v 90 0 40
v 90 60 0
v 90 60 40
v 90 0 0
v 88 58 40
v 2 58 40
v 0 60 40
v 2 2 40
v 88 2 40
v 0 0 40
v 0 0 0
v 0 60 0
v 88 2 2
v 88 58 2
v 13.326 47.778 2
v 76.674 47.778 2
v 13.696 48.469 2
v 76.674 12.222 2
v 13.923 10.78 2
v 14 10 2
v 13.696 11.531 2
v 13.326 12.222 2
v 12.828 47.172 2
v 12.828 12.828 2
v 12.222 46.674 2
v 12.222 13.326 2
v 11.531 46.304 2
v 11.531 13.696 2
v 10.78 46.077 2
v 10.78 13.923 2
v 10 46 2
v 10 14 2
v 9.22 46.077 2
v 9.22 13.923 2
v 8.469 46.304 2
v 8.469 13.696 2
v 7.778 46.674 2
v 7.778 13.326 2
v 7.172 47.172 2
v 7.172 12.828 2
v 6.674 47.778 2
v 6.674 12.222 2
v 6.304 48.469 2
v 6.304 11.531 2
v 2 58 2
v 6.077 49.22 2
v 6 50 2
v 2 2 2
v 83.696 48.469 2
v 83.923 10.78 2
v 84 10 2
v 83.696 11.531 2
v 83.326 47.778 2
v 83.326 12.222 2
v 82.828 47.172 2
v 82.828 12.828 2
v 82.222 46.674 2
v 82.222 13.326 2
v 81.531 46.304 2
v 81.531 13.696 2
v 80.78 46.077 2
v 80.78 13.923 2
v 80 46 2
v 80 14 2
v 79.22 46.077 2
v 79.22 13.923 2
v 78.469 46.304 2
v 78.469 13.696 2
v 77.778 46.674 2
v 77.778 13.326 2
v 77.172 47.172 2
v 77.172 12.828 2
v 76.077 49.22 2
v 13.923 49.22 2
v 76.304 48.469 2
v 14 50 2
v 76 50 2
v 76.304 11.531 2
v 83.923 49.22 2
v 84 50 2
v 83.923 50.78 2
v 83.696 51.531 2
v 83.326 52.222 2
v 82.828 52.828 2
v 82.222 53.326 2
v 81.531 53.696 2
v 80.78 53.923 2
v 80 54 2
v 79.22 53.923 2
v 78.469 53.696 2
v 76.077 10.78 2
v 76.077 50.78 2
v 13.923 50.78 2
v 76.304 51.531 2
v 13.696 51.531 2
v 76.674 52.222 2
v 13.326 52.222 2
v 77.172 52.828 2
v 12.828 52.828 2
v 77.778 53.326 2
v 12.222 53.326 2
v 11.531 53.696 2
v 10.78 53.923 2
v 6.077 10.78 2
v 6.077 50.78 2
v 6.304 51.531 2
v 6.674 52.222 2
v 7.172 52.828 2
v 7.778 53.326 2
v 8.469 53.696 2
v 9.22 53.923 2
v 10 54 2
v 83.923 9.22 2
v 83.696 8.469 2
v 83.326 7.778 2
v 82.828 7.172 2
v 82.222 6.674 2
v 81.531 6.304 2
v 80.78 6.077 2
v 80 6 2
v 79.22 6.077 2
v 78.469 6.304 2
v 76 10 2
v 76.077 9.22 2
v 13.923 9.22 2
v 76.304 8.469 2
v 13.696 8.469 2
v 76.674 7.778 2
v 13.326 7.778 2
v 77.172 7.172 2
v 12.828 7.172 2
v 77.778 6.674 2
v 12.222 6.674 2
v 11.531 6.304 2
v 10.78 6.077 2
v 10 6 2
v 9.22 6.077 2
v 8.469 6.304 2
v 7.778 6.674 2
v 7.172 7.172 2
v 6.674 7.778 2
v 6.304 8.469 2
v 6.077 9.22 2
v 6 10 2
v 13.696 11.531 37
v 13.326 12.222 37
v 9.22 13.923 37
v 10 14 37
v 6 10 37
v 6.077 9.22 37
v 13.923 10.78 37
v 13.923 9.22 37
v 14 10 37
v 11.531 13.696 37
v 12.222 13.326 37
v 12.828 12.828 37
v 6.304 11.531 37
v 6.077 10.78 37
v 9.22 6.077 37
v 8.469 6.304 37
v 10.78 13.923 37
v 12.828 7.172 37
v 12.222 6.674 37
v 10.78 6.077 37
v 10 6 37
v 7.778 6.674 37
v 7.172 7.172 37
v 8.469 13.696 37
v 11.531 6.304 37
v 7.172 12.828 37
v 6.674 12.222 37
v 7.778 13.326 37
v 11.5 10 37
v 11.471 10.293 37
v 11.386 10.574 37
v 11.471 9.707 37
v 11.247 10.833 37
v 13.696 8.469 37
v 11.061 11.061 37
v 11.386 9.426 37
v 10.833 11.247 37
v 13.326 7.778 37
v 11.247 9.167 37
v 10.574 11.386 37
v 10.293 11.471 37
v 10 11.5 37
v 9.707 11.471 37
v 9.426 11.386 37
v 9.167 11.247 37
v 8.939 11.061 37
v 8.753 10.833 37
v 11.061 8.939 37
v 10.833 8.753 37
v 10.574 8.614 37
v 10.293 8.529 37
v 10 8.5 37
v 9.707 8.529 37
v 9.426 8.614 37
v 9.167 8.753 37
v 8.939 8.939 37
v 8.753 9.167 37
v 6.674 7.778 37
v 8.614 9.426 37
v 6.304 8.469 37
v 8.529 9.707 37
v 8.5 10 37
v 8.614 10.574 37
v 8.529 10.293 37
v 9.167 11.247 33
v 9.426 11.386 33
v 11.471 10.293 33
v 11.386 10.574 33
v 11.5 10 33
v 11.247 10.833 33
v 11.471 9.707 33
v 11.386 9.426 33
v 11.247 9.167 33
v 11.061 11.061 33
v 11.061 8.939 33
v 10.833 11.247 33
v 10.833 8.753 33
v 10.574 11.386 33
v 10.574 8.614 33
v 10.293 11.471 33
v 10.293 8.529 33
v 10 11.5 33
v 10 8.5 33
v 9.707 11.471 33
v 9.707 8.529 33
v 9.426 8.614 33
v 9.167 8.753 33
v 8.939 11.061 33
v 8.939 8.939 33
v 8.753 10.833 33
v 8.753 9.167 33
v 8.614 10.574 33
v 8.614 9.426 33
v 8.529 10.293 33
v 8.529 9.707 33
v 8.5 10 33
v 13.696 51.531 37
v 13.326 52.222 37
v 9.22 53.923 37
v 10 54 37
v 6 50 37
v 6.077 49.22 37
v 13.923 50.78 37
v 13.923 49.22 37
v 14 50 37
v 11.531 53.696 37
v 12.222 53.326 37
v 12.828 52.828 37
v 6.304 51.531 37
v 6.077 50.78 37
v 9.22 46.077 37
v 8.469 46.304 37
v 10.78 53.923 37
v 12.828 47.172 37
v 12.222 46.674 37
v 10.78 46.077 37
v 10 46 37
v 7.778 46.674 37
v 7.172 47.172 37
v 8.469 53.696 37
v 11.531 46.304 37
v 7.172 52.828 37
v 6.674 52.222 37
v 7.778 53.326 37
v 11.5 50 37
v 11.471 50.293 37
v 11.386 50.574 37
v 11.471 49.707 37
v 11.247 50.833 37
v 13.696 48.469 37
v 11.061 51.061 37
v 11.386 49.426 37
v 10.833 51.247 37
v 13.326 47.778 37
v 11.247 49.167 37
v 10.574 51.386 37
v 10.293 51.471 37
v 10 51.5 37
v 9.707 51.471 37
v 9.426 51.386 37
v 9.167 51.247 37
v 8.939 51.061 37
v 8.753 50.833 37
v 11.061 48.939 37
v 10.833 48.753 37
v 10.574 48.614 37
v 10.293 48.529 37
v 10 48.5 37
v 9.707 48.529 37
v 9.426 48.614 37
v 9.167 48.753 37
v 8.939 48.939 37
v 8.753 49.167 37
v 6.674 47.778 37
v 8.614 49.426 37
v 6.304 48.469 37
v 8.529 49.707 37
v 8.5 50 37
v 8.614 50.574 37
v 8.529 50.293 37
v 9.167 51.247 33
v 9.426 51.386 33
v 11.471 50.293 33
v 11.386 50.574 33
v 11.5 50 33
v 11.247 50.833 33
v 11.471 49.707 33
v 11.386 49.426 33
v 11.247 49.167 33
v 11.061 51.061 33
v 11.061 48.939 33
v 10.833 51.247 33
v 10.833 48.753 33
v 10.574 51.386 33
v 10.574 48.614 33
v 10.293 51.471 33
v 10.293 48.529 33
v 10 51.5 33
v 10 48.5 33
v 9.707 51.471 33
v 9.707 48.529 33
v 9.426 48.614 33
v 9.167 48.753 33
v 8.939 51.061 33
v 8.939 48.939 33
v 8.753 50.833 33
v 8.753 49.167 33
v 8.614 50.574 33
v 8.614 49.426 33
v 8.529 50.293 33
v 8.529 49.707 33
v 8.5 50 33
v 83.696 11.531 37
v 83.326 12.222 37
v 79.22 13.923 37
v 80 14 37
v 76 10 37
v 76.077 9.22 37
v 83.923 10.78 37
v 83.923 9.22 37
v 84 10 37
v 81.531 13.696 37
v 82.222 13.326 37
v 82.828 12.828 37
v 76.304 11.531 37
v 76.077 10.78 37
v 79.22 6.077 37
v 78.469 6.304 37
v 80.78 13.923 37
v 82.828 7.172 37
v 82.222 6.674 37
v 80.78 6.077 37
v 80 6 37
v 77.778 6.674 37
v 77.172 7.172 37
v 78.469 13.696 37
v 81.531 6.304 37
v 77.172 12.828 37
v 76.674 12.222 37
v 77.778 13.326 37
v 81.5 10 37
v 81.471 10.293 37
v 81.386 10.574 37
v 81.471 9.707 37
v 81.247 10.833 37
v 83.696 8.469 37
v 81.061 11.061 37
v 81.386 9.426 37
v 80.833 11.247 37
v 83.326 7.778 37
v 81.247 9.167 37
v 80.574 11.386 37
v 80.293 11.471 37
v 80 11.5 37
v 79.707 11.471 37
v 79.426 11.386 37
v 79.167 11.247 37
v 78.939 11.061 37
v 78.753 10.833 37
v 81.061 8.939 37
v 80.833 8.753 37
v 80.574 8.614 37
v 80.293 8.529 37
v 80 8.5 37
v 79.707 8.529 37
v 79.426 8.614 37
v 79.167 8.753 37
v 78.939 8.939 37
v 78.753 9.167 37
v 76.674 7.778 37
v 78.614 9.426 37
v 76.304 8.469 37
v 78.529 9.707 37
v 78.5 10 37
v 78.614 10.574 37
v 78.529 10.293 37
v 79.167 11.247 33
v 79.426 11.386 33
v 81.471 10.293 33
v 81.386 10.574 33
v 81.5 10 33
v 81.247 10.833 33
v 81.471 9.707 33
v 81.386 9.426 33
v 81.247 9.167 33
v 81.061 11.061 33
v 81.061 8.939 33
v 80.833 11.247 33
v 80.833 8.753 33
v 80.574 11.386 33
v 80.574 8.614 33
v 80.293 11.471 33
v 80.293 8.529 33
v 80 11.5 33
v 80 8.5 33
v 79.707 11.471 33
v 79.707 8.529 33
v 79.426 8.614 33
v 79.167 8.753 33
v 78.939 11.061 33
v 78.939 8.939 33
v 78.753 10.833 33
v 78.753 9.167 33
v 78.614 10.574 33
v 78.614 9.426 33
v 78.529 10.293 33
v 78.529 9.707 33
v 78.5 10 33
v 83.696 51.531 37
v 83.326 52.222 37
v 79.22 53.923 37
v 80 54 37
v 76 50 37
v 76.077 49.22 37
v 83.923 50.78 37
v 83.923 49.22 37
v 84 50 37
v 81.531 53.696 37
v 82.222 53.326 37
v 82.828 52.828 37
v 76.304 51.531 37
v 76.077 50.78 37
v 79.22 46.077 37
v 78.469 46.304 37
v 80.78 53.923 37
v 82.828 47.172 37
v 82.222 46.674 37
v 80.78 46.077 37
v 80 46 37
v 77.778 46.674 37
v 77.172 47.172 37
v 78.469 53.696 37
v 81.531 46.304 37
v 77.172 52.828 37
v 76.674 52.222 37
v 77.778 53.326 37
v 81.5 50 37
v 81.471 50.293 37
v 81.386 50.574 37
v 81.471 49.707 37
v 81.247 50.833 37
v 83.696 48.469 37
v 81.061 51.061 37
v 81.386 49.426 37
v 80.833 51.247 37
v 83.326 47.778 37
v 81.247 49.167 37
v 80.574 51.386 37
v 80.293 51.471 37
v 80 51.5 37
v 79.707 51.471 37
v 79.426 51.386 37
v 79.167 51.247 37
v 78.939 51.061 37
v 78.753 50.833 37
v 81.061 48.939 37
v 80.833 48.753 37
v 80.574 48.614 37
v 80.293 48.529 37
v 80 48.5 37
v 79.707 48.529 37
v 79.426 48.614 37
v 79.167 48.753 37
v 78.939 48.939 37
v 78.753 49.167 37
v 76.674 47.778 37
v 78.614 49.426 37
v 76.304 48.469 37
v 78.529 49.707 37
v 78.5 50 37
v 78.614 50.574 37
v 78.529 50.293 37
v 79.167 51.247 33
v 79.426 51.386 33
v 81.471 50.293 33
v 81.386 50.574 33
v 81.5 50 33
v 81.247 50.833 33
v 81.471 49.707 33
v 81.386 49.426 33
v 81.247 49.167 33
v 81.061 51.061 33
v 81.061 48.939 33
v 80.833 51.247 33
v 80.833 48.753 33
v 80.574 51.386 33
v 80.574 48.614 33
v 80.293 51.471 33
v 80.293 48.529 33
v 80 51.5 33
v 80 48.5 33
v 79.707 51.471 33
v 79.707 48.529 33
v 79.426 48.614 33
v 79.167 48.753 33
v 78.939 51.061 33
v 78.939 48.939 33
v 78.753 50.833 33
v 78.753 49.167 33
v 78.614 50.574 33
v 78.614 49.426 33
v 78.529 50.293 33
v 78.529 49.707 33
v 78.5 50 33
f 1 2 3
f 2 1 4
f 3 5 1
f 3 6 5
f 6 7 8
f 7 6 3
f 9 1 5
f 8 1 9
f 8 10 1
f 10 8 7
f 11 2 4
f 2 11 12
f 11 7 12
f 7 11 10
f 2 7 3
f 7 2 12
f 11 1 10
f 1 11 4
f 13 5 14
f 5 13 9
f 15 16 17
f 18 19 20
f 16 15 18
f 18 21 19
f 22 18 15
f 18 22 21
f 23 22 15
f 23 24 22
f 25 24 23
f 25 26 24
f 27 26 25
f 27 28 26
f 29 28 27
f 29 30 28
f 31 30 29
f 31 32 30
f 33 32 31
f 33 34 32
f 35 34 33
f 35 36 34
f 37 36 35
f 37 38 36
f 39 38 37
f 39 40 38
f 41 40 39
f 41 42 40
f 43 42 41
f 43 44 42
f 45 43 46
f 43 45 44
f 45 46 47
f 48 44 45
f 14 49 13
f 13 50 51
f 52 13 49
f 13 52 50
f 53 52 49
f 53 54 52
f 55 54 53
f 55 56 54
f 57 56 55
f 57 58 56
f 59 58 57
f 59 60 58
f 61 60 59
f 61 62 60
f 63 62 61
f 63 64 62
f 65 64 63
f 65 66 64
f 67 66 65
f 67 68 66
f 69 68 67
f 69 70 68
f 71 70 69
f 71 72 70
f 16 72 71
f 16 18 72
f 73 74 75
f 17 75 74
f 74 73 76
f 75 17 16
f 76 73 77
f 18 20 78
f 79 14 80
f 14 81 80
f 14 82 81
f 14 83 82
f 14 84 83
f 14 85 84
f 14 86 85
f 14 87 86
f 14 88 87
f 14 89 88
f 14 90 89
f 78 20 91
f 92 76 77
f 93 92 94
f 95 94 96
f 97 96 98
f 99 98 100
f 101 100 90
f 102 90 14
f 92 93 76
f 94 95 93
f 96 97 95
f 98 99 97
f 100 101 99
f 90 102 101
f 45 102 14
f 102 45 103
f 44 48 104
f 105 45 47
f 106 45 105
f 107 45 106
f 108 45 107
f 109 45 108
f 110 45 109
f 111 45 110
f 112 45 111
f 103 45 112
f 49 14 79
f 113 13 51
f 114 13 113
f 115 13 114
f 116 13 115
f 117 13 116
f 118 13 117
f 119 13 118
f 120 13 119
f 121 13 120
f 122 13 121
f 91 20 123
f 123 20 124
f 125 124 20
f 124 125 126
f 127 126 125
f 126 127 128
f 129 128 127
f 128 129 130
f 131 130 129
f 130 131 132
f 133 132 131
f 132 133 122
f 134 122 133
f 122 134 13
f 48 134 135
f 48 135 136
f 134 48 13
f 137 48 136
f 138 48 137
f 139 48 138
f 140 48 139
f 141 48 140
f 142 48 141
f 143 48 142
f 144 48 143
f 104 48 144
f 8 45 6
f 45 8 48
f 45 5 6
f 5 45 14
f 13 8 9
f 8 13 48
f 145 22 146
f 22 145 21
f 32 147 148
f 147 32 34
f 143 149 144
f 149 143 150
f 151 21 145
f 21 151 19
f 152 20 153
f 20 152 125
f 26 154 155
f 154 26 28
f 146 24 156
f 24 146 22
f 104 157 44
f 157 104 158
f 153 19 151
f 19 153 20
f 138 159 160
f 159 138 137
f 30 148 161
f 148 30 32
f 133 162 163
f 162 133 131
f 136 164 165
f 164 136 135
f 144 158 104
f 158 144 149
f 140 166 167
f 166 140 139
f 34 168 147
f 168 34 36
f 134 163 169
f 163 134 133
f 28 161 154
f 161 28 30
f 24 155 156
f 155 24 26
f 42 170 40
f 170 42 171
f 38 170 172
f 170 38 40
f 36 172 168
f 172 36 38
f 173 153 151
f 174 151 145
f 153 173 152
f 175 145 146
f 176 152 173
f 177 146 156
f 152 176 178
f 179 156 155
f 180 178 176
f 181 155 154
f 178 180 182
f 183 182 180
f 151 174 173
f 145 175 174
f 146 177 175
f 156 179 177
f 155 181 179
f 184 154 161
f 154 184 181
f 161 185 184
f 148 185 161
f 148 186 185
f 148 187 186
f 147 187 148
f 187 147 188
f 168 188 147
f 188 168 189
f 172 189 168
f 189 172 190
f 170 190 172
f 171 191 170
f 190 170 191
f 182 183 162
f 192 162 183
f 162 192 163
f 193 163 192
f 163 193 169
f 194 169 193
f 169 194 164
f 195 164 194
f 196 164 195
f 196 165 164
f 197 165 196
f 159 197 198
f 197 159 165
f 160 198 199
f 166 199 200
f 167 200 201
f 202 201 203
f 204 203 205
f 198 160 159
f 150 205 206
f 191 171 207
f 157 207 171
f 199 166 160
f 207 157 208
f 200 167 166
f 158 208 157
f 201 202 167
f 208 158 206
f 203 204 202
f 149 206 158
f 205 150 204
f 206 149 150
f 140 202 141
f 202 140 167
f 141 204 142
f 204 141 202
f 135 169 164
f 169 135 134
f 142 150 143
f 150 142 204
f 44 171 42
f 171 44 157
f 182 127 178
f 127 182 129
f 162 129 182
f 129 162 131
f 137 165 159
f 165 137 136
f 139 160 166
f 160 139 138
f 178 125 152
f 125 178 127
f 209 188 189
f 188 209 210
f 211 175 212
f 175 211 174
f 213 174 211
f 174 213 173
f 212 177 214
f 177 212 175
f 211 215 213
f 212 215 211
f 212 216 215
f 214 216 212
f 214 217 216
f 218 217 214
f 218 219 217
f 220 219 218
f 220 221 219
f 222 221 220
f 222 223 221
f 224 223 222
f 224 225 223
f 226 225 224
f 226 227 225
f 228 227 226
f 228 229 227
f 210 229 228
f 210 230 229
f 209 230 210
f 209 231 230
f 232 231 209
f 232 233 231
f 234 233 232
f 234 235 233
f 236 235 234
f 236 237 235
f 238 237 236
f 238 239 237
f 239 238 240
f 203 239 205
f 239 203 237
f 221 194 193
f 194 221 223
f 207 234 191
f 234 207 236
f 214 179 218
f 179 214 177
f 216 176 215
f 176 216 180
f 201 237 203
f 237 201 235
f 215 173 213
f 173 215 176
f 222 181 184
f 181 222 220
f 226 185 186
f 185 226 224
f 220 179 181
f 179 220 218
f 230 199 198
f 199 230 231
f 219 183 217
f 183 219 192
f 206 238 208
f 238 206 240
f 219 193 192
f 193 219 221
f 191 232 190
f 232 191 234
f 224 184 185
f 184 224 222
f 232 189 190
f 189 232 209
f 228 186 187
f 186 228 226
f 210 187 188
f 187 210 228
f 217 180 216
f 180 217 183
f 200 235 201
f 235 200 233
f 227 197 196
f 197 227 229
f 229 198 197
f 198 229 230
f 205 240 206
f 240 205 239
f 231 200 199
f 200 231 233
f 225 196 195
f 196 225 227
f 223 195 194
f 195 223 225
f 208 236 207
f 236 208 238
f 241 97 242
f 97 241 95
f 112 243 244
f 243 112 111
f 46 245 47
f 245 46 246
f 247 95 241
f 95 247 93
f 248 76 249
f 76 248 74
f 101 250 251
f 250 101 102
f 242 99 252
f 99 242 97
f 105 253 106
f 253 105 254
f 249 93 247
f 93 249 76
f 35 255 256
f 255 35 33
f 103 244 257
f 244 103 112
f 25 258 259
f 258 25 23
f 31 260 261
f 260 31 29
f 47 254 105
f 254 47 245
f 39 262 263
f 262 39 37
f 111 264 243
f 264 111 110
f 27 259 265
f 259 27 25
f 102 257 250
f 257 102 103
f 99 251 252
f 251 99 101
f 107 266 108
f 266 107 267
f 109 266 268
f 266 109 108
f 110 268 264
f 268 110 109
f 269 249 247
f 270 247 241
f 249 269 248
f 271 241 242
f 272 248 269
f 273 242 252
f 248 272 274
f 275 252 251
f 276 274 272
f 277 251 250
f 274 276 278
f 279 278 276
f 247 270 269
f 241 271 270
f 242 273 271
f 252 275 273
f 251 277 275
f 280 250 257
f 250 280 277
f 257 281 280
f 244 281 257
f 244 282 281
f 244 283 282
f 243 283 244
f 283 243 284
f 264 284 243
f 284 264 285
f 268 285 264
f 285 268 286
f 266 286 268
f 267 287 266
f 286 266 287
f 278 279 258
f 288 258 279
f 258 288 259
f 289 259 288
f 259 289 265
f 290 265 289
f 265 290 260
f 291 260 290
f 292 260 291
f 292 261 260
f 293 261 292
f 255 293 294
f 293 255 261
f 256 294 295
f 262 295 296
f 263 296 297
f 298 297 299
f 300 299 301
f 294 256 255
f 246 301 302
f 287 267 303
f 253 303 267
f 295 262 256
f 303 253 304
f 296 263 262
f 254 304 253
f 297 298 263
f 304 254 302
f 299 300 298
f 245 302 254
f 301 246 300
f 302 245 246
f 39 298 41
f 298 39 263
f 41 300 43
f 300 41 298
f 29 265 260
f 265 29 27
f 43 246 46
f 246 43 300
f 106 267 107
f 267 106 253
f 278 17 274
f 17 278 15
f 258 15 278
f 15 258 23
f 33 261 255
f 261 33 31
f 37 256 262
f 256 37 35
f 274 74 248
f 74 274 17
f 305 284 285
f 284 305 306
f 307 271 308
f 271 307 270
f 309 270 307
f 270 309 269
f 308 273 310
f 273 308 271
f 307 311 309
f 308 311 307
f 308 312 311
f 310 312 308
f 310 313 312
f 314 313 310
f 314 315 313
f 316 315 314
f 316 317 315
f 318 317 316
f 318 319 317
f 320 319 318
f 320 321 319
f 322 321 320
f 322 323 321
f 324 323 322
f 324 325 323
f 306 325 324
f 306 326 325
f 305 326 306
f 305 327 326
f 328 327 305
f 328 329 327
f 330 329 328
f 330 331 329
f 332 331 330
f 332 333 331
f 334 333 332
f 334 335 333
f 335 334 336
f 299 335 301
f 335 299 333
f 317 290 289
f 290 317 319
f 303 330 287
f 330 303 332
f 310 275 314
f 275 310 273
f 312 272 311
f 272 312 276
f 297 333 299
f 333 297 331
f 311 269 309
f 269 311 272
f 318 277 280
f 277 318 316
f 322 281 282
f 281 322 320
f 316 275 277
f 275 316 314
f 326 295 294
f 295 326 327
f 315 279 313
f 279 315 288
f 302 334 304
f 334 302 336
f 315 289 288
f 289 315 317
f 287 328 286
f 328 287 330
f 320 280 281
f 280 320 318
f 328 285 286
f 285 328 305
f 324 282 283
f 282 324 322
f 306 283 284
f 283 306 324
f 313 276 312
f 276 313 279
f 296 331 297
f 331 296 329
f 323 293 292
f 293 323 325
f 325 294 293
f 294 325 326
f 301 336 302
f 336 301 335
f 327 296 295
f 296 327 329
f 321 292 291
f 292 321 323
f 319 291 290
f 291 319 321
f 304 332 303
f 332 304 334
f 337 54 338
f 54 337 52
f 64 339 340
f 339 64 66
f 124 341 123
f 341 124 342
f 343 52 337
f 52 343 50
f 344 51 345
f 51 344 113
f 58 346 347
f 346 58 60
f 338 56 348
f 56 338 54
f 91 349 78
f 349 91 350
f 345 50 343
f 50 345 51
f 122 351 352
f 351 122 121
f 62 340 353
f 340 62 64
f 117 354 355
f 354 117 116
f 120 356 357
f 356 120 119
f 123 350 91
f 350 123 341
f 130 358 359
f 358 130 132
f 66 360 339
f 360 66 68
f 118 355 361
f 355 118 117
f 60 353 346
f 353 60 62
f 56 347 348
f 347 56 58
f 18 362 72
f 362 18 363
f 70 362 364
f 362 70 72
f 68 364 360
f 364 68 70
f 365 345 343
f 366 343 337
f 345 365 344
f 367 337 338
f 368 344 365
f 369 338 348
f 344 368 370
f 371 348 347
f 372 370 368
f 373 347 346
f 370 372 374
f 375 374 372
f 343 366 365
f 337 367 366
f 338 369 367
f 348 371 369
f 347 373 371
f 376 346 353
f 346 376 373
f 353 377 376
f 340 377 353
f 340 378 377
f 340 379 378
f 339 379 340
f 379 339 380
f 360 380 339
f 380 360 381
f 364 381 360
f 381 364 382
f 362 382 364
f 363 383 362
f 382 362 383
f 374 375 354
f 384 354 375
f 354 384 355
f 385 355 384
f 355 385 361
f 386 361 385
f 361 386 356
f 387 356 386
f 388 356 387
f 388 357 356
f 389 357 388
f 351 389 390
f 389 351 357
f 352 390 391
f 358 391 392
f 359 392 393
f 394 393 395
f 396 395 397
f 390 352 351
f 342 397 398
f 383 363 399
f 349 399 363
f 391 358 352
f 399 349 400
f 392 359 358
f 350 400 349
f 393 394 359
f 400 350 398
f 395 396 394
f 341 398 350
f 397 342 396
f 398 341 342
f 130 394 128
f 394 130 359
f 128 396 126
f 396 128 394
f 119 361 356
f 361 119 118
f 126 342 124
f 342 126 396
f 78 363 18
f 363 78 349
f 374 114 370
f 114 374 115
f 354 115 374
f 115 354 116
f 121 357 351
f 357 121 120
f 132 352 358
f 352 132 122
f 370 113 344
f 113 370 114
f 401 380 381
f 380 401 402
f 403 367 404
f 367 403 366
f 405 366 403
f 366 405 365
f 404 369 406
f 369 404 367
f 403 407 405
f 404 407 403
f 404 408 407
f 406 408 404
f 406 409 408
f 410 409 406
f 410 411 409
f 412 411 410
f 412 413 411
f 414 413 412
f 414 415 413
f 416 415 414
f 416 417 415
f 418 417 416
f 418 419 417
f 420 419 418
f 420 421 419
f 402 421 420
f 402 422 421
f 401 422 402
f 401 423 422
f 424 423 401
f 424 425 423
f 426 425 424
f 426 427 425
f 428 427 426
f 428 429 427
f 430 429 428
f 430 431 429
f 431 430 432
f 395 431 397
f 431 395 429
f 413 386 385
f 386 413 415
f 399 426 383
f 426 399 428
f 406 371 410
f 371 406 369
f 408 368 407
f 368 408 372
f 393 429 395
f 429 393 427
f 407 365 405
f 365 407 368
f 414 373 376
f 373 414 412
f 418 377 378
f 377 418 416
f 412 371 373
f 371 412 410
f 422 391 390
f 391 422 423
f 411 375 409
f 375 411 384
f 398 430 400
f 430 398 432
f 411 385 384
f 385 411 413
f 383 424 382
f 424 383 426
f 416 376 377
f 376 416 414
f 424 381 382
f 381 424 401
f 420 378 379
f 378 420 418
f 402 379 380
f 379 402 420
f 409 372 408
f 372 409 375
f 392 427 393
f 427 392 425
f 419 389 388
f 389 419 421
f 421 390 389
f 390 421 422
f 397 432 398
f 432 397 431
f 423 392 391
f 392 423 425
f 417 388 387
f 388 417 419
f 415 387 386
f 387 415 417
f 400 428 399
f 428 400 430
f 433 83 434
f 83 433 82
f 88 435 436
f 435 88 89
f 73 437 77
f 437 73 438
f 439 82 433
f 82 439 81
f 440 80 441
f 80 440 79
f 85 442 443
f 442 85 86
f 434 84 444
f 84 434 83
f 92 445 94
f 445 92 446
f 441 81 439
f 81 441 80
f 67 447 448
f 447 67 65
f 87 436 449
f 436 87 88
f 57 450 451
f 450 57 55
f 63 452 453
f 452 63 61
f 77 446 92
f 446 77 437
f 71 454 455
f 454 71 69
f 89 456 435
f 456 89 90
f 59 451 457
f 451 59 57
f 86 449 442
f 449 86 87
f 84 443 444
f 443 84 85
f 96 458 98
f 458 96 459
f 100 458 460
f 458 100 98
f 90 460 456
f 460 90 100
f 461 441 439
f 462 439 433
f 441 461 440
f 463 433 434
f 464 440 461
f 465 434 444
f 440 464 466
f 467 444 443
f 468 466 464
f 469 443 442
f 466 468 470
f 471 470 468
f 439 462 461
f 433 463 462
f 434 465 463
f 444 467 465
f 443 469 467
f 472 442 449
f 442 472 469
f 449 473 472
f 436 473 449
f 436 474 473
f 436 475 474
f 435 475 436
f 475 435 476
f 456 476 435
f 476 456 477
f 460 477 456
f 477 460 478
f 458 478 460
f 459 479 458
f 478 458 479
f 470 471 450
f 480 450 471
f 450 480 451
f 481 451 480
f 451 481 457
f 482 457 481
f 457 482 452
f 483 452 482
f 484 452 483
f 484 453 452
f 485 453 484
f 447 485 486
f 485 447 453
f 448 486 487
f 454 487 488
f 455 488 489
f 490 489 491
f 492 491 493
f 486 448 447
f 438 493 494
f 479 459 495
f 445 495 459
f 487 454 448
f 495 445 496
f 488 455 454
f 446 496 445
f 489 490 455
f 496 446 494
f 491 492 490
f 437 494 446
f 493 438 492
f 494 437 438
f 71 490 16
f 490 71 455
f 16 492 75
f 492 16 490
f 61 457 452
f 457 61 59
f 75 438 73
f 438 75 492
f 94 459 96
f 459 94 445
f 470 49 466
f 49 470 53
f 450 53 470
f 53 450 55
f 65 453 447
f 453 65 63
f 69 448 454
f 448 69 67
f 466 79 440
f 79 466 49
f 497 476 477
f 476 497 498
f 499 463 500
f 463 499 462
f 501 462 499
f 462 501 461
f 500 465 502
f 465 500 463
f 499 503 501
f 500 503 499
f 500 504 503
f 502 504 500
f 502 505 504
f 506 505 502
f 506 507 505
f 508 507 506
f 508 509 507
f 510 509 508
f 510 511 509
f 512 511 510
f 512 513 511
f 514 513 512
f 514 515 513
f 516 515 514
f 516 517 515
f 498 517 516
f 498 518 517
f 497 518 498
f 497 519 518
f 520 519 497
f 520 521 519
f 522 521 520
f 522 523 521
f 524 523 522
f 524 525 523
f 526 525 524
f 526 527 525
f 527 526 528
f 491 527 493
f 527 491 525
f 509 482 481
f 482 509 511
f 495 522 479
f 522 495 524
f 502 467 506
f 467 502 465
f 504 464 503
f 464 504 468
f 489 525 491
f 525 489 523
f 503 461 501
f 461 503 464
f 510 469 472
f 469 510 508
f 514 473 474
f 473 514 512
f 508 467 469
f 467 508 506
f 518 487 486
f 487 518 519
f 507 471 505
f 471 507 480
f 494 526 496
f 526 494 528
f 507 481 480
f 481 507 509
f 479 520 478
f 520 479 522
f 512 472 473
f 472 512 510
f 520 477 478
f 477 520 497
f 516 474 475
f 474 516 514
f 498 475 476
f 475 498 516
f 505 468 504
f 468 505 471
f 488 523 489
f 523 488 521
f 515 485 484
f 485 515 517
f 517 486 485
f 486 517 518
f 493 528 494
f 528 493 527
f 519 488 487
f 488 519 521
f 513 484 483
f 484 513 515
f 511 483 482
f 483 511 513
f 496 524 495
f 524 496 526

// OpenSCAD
$fn = 32;

// ----------------------------------------------------------------------
// Enclosure box: bosses enclosure
// ----------------------------------------------------------------------

// --- parameters (mm) ---
box_l = 90;               // outer length, X
box_w = 60;               // outer width, Y
box_h = 40;               // outer height
wall_t = 2;               // wall thickness
boss_r = 4;               // corner boss radius
hole_r = 1.5;             // boss screw hole radius
boss_in = 10;             // boss inset from the corners
fit_tol = 0.1;            // tolerance for press fits, mm
free_tol = 0.5;           // tolerance for clearance fits, mm

inner_h = box_h - wall_t;  // cavity depth
boss_h = inner_h - 2;  // corner boss height

difference() {
  union() {
    difference() {
      cube([box_l, box_w, box_h]);
      translate([wall_t, wall_t, wall_t])
        cube([box_l - 2 * wall_t, box_w - 2 * wall_t, box_h]);
    }
    for (sx = [0, 1], sy = [0, 1])
      translate([sx ? box_l - boss_in : boss_in,
                 sy ? box_w - boss_in : boss_in, wall_t - 1])
        difference() {
          cylinder(r = boss_r, h = boss_h);
          translate([0, 0, boss_h - 4])
            cylinder(r = hole_r, h = 5);
        }
  }
}
